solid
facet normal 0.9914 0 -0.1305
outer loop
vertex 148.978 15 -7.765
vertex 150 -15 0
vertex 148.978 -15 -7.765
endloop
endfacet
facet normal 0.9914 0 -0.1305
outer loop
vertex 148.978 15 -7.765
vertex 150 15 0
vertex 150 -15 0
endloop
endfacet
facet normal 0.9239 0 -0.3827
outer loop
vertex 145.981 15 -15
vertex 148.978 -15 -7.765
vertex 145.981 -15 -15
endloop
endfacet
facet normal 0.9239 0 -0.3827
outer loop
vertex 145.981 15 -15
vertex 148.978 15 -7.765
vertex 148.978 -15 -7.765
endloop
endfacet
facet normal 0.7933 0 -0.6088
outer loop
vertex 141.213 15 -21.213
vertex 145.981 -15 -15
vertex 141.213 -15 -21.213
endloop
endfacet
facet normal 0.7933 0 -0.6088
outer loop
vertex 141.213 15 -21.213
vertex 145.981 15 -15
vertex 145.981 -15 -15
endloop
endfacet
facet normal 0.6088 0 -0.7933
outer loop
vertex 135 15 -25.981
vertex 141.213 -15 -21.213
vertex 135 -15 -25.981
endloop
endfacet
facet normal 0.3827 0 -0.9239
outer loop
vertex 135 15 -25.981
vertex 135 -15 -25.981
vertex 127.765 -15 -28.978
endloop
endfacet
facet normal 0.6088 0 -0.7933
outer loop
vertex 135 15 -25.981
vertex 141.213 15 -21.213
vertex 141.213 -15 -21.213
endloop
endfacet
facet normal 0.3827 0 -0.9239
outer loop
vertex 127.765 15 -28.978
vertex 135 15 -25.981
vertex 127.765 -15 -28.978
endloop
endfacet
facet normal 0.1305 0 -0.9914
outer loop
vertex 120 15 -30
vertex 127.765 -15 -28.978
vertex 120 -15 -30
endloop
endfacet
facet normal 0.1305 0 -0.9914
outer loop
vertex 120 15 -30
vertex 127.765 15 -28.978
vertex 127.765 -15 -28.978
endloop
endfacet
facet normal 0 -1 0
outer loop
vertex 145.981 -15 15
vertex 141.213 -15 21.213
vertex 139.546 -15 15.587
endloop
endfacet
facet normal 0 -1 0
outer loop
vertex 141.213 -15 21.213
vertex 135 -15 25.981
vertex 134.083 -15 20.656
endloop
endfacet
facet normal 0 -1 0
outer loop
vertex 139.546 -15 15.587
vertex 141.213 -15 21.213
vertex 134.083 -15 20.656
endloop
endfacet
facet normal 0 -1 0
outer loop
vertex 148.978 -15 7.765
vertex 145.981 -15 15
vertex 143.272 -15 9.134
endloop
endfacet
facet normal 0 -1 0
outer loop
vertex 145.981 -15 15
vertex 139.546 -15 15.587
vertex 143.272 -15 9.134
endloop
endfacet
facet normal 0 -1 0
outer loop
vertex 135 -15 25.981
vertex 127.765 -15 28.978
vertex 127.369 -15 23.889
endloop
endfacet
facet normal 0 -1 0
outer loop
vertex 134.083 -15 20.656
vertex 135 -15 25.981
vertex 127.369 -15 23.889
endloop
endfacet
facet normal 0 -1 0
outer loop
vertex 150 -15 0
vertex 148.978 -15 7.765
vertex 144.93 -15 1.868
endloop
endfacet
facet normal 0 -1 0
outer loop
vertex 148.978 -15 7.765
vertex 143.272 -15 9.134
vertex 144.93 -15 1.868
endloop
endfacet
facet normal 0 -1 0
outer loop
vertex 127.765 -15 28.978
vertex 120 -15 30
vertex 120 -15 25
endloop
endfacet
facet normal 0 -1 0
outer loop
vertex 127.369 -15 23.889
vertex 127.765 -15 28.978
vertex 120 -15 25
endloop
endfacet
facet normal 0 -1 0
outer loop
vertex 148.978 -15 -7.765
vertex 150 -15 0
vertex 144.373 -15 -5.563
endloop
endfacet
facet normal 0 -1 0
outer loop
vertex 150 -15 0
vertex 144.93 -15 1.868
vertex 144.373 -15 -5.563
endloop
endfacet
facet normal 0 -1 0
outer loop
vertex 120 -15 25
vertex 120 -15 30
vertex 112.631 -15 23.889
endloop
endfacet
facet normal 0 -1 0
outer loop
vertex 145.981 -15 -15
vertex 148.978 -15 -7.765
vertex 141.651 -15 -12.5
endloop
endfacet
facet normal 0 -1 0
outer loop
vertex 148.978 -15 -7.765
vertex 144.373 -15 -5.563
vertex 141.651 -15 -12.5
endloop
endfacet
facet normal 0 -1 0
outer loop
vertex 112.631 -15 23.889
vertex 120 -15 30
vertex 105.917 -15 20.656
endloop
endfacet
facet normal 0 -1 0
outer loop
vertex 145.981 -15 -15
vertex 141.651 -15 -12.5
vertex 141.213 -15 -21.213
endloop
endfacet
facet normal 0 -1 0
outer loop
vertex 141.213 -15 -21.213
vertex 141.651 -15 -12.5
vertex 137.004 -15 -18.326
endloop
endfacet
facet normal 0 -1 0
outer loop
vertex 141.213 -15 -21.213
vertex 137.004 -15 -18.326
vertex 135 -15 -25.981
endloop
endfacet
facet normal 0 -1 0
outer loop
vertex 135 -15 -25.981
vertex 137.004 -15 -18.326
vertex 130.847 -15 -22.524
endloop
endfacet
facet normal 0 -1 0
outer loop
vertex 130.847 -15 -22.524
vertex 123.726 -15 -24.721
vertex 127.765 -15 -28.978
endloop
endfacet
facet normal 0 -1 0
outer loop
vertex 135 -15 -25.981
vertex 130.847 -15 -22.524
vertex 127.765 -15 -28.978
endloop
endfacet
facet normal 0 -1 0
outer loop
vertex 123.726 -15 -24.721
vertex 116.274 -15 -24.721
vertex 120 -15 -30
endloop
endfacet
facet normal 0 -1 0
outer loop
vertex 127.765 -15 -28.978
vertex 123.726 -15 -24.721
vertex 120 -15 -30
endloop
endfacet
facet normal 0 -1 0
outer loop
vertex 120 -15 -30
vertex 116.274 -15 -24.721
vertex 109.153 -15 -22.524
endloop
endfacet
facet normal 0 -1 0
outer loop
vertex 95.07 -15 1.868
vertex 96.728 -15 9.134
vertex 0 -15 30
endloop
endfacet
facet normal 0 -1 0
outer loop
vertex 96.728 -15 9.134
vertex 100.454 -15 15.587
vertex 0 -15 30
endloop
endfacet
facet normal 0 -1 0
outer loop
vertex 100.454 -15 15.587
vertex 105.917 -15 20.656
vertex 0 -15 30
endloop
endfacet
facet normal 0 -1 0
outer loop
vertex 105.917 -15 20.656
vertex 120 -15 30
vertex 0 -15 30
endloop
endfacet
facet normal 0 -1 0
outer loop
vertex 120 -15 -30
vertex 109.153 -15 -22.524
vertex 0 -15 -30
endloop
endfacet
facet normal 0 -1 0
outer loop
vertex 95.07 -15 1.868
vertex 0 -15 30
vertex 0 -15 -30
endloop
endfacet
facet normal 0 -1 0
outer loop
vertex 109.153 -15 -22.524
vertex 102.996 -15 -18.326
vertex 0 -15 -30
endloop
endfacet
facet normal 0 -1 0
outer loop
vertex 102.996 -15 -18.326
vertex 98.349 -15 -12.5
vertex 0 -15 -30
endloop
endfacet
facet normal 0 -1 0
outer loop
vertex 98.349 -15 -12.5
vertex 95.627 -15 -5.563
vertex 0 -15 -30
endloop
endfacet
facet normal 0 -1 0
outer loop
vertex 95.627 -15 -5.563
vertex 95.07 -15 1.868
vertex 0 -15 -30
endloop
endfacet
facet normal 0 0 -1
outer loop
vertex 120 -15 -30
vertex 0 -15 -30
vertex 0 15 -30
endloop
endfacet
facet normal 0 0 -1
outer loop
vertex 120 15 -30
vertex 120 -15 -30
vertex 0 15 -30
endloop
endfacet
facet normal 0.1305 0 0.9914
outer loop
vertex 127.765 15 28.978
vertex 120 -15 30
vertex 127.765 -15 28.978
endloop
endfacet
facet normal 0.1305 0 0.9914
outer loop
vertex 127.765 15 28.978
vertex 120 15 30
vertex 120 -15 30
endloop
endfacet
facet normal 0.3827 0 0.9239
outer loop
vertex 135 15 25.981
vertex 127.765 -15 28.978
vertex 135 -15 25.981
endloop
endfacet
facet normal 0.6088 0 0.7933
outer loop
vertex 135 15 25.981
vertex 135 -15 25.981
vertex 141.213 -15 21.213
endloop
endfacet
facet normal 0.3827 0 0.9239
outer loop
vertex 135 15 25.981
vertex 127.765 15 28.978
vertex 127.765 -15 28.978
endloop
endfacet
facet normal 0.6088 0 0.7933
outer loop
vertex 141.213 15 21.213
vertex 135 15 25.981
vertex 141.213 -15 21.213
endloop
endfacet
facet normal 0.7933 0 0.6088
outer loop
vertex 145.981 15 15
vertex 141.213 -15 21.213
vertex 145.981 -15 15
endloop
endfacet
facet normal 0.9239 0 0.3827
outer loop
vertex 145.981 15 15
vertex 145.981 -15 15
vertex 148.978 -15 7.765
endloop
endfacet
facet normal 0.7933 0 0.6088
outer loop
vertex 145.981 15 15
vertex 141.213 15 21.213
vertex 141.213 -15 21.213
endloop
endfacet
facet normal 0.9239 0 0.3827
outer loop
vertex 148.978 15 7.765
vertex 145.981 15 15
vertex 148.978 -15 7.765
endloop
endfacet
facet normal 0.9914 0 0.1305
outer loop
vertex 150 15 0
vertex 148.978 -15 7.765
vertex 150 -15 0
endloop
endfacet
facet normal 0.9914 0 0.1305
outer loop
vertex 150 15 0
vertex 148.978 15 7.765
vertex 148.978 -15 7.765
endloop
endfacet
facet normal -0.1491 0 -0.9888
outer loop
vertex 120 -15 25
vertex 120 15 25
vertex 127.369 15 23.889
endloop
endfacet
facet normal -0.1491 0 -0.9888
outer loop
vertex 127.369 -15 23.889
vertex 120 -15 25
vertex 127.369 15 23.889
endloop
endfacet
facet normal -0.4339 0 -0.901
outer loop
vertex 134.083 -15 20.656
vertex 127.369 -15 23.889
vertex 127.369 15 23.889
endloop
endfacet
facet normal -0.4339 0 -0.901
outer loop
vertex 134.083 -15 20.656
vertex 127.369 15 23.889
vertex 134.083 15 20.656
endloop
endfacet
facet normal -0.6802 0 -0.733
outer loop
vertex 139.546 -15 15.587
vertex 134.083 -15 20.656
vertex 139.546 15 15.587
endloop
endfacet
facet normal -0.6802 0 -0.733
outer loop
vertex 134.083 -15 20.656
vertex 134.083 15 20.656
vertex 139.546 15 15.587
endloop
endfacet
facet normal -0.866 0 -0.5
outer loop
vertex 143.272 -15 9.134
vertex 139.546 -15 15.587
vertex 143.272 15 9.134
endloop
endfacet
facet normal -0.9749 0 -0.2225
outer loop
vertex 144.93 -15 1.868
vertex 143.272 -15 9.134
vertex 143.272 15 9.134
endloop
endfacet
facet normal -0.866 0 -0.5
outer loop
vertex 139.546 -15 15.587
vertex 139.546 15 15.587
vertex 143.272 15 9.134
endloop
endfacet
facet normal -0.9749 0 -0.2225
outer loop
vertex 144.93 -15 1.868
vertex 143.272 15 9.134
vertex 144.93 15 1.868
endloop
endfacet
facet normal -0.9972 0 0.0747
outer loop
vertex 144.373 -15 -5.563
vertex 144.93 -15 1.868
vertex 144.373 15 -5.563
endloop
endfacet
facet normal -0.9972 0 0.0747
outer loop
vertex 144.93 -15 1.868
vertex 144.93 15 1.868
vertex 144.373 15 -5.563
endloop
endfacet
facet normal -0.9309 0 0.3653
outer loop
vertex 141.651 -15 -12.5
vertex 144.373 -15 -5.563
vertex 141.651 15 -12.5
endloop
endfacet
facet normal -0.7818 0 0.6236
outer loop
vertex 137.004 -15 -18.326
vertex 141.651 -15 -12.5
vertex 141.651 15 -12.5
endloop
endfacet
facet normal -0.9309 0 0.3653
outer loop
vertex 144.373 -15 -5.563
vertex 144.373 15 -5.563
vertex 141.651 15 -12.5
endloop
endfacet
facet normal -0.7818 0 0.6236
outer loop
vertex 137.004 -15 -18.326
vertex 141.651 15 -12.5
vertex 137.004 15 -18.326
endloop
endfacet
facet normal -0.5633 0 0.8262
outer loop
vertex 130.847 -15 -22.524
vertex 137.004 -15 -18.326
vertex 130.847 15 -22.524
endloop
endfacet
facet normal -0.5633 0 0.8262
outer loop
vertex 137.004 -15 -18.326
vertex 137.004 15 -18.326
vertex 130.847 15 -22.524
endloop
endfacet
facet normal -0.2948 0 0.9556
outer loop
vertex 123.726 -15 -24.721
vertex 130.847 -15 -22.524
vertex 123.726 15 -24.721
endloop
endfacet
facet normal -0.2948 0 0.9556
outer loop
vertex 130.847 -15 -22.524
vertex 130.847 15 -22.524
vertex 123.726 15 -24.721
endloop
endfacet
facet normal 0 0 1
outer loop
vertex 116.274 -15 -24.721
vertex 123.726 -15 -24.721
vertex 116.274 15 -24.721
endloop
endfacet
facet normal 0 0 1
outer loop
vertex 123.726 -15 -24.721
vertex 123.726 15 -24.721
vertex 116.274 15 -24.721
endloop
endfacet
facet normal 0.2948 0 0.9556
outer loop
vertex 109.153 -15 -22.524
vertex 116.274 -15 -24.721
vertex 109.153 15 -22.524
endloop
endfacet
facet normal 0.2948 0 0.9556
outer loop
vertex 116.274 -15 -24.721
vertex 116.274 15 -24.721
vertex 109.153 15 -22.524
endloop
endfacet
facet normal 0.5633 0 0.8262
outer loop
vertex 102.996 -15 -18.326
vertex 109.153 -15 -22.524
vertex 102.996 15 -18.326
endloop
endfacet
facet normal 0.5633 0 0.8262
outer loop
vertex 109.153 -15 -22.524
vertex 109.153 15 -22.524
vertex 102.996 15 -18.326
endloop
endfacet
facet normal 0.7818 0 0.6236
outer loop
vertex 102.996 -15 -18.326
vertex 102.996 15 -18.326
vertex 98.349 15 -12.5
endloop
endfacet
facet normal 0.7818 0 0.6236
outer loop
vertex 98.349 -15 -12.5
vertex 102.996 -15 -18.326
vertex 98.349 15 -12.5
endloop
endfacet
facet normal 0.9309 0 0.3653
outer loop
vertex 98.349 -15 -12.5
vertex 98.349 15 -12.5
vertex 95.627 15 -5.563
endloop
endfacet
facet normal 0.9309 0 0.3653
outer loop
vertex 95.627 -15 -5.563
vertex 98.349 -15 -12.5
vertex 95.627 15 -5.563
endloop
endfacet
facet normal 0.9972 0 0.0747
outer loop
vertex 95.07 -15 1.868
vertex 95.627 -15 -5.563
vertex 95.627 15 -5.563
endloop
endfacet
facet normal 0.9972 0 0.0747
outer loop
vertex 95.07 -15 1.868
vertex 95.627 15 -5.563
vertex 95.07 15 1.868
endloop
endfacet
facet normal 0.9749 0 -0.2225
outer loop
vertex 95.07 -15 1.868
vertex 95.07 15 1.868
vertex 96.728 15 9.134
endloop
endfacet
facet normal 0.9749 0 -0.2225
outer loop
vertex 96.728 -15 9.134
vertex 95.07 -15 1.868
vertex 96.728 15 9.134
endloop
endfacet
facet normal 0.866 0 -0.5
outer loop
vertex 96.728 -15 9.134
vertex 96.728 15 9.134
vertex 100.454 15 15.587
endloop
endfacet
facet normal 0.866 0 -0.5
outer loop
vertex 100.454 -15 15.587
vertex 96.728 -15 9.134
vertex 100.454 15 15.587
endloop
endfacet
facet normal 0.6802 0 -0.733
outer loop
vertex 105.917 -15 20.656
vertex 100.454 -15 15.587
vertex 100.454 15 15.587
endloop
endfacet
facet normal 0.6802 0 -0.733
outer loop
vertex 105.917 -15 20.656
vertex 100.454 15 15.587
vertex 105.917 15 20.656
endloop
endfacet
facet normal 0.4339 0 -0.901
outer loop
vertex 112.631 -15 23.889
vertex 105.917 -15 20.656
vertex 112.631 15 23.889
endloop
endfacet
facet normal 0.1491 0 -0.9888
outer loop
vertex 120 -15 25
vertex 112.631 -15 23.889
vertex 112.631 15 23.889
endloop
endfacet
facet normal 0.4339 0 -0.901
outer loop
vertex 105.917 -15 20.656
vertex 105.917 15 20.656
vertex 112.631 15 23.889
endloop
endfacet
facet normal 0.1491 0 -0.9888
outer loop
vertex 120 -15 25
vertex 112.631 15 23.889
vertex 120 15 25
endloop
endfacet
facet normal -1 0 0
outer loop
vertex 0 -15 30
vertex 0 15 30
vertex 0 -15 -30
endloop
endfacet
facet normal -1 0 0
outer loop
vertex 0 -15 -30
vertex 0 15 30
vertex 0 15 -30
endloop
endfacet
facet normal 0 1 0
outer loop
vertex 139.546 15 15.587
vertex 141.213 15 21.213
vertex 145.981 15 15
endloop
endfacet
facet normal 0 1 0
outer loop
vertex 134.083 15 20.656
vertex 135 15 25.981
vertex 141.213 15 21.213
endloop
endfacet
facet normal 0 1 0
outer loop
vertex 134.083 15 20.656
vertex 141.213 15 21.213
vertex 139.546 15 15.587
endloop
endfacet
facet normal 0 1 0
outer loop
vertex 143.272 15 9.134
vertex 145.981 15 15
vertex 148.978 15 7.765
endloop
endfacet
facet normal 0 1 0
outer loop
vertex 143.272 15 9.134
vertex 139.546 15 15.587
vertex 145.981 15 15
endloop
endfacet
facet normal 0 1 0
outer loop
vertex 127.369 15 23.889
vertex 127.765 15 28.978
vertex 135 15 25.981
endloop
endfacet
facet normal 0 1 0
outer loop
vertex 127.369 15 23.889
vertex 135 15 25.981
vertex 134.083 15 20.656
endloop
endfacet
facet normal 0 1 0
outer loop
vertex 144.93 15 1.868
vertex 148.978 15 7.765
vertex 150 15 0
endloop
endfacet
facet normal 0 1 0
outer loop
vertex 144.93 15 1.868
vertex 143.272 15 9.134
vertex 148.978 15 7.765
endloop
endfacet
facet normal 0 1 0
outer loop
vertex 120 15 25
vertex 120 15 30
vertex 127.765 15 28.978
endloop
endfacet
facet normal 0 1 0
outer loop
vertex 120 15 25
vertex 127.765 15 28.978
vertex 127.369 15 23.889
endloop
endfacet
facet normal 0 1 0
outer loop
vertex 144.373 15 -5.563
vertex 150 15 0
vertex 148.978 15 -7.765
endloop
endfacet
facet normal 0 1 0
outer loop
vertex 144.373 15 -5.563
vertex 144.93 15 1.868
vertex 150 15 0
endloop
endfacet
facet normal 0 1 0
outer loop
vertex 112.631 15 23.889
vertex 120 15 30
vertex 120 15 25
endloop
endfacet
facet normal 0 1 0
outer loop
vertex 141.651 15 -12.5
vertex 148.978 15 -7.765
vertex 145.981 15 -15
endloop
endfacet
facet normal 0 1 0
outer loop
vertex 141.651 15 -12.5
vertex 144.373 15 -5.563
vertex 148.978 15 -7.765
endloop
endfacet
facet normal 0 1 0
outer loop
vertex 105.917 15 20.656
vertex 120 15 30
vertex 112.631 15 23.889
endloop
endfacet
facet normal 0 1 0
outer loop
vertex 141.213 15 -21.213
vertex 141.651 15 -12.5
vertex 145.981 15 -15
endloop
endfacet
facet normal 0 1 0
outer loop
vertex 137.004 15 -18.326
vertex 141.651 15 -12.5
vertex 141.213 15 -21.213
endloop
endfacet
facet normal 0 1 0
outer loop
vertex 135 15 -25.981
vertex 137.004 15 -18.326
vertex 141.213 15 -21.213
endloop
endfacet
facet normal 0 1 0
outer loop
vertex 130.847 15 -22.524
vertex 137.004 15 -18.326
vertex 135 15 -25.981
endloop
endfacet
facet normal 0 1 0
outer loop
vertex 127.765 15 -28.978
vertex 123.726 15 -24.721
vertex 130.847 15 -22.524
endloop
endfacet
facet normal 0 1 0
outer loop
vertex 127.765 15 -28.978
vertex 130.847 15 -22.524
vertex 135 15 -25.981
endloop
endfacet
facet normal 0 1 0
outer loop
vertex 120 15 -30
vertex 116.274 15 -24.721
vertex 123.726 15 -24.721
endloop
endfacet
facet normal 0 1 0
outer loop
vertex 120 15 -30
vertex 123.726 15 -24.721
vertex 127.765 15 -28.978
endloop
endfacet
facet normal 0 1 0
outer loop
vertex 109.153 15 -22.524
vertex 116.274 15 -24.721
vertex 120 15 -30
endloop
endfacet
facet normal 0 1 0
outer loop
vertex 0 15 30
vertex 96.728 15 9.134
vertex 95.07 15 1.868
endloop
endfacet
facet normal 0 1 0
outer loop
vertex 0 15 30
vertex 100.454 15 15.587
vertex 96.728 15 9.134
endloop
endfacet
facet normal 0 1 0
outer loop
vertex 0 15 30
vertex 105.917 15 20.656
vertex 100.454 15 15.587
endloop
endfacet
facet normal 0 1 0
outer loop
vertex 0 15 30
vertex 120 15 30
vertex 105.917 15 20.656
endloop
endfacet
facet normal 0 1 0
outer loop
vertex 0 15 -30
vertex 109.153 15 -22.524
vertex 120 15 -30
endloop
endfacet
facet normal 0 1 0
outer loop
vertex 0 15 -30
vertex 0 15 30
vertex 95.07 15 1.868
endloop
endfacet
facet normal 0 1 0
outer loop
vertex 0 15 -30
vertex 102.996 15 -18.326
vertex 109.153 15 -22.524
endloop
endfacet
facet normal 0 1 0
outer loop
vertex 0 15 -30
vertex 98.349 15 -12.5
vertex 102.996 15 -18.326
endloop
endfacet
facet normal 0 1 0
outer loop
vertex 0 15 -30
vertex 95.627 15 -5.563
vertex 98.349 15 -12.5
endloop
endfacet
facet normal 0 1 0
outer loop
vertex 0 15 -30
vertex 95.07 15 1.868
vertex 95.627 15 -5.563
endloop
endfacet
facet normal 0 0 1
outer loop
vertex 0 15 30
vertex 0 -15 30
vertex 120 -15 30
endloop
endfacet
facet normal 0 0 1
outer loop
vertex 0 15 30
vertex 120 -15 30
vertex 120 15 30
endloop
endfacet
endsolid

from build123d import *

# Parameters (mm, degrees)
SKETCH1_W           = 60
SKETCH1_H           = 30
BOSS_EXTRUDE1_DEPTH = 150
SKETCH2_R           = 25
CUT_EXTRUDE1_DEPTH  = 30
FILLET1_R           = 30


with BuildPart() as part:
    # Sketch1 → Boss-Extrude1 (new body)
    with BuildSketch(Plane(origin=(0, 0, 0), x_dir=(0, 0, -1), z_dir=(1, 0, 0))):
        Rectangle(SKETCH1_W, SKETCH1_H)
    extrude(amount=BOSS_EXTRUDE1_DEPTH)

    # Sketch2 → Cut-Extrude1 (cut)
    with BuildSketch(Plane(origin=(0, 15, 0), x_dir=(1, 0, 0), z_dir=(0, 1, 0))):
        with Locations(Location((120, 0, 0), (0, 0, 270))):
            Circle(SKETCH2_R)
    extrude(amount=-CUT_EXTRUDE1_DEPTH, mode=Mode.SUBTRACT)

    # Fillet1
    fillet1_edges = [part.edges().sort_by_distance(p)[0] for p in [
        (150, 0, -30),
        (150, 0, 30),
    ]]
    fillet(fillet1_edges, radius=FILLET1_R - 0.0001)  # a hair under: the kernel refuses the full size


solid = part.part
